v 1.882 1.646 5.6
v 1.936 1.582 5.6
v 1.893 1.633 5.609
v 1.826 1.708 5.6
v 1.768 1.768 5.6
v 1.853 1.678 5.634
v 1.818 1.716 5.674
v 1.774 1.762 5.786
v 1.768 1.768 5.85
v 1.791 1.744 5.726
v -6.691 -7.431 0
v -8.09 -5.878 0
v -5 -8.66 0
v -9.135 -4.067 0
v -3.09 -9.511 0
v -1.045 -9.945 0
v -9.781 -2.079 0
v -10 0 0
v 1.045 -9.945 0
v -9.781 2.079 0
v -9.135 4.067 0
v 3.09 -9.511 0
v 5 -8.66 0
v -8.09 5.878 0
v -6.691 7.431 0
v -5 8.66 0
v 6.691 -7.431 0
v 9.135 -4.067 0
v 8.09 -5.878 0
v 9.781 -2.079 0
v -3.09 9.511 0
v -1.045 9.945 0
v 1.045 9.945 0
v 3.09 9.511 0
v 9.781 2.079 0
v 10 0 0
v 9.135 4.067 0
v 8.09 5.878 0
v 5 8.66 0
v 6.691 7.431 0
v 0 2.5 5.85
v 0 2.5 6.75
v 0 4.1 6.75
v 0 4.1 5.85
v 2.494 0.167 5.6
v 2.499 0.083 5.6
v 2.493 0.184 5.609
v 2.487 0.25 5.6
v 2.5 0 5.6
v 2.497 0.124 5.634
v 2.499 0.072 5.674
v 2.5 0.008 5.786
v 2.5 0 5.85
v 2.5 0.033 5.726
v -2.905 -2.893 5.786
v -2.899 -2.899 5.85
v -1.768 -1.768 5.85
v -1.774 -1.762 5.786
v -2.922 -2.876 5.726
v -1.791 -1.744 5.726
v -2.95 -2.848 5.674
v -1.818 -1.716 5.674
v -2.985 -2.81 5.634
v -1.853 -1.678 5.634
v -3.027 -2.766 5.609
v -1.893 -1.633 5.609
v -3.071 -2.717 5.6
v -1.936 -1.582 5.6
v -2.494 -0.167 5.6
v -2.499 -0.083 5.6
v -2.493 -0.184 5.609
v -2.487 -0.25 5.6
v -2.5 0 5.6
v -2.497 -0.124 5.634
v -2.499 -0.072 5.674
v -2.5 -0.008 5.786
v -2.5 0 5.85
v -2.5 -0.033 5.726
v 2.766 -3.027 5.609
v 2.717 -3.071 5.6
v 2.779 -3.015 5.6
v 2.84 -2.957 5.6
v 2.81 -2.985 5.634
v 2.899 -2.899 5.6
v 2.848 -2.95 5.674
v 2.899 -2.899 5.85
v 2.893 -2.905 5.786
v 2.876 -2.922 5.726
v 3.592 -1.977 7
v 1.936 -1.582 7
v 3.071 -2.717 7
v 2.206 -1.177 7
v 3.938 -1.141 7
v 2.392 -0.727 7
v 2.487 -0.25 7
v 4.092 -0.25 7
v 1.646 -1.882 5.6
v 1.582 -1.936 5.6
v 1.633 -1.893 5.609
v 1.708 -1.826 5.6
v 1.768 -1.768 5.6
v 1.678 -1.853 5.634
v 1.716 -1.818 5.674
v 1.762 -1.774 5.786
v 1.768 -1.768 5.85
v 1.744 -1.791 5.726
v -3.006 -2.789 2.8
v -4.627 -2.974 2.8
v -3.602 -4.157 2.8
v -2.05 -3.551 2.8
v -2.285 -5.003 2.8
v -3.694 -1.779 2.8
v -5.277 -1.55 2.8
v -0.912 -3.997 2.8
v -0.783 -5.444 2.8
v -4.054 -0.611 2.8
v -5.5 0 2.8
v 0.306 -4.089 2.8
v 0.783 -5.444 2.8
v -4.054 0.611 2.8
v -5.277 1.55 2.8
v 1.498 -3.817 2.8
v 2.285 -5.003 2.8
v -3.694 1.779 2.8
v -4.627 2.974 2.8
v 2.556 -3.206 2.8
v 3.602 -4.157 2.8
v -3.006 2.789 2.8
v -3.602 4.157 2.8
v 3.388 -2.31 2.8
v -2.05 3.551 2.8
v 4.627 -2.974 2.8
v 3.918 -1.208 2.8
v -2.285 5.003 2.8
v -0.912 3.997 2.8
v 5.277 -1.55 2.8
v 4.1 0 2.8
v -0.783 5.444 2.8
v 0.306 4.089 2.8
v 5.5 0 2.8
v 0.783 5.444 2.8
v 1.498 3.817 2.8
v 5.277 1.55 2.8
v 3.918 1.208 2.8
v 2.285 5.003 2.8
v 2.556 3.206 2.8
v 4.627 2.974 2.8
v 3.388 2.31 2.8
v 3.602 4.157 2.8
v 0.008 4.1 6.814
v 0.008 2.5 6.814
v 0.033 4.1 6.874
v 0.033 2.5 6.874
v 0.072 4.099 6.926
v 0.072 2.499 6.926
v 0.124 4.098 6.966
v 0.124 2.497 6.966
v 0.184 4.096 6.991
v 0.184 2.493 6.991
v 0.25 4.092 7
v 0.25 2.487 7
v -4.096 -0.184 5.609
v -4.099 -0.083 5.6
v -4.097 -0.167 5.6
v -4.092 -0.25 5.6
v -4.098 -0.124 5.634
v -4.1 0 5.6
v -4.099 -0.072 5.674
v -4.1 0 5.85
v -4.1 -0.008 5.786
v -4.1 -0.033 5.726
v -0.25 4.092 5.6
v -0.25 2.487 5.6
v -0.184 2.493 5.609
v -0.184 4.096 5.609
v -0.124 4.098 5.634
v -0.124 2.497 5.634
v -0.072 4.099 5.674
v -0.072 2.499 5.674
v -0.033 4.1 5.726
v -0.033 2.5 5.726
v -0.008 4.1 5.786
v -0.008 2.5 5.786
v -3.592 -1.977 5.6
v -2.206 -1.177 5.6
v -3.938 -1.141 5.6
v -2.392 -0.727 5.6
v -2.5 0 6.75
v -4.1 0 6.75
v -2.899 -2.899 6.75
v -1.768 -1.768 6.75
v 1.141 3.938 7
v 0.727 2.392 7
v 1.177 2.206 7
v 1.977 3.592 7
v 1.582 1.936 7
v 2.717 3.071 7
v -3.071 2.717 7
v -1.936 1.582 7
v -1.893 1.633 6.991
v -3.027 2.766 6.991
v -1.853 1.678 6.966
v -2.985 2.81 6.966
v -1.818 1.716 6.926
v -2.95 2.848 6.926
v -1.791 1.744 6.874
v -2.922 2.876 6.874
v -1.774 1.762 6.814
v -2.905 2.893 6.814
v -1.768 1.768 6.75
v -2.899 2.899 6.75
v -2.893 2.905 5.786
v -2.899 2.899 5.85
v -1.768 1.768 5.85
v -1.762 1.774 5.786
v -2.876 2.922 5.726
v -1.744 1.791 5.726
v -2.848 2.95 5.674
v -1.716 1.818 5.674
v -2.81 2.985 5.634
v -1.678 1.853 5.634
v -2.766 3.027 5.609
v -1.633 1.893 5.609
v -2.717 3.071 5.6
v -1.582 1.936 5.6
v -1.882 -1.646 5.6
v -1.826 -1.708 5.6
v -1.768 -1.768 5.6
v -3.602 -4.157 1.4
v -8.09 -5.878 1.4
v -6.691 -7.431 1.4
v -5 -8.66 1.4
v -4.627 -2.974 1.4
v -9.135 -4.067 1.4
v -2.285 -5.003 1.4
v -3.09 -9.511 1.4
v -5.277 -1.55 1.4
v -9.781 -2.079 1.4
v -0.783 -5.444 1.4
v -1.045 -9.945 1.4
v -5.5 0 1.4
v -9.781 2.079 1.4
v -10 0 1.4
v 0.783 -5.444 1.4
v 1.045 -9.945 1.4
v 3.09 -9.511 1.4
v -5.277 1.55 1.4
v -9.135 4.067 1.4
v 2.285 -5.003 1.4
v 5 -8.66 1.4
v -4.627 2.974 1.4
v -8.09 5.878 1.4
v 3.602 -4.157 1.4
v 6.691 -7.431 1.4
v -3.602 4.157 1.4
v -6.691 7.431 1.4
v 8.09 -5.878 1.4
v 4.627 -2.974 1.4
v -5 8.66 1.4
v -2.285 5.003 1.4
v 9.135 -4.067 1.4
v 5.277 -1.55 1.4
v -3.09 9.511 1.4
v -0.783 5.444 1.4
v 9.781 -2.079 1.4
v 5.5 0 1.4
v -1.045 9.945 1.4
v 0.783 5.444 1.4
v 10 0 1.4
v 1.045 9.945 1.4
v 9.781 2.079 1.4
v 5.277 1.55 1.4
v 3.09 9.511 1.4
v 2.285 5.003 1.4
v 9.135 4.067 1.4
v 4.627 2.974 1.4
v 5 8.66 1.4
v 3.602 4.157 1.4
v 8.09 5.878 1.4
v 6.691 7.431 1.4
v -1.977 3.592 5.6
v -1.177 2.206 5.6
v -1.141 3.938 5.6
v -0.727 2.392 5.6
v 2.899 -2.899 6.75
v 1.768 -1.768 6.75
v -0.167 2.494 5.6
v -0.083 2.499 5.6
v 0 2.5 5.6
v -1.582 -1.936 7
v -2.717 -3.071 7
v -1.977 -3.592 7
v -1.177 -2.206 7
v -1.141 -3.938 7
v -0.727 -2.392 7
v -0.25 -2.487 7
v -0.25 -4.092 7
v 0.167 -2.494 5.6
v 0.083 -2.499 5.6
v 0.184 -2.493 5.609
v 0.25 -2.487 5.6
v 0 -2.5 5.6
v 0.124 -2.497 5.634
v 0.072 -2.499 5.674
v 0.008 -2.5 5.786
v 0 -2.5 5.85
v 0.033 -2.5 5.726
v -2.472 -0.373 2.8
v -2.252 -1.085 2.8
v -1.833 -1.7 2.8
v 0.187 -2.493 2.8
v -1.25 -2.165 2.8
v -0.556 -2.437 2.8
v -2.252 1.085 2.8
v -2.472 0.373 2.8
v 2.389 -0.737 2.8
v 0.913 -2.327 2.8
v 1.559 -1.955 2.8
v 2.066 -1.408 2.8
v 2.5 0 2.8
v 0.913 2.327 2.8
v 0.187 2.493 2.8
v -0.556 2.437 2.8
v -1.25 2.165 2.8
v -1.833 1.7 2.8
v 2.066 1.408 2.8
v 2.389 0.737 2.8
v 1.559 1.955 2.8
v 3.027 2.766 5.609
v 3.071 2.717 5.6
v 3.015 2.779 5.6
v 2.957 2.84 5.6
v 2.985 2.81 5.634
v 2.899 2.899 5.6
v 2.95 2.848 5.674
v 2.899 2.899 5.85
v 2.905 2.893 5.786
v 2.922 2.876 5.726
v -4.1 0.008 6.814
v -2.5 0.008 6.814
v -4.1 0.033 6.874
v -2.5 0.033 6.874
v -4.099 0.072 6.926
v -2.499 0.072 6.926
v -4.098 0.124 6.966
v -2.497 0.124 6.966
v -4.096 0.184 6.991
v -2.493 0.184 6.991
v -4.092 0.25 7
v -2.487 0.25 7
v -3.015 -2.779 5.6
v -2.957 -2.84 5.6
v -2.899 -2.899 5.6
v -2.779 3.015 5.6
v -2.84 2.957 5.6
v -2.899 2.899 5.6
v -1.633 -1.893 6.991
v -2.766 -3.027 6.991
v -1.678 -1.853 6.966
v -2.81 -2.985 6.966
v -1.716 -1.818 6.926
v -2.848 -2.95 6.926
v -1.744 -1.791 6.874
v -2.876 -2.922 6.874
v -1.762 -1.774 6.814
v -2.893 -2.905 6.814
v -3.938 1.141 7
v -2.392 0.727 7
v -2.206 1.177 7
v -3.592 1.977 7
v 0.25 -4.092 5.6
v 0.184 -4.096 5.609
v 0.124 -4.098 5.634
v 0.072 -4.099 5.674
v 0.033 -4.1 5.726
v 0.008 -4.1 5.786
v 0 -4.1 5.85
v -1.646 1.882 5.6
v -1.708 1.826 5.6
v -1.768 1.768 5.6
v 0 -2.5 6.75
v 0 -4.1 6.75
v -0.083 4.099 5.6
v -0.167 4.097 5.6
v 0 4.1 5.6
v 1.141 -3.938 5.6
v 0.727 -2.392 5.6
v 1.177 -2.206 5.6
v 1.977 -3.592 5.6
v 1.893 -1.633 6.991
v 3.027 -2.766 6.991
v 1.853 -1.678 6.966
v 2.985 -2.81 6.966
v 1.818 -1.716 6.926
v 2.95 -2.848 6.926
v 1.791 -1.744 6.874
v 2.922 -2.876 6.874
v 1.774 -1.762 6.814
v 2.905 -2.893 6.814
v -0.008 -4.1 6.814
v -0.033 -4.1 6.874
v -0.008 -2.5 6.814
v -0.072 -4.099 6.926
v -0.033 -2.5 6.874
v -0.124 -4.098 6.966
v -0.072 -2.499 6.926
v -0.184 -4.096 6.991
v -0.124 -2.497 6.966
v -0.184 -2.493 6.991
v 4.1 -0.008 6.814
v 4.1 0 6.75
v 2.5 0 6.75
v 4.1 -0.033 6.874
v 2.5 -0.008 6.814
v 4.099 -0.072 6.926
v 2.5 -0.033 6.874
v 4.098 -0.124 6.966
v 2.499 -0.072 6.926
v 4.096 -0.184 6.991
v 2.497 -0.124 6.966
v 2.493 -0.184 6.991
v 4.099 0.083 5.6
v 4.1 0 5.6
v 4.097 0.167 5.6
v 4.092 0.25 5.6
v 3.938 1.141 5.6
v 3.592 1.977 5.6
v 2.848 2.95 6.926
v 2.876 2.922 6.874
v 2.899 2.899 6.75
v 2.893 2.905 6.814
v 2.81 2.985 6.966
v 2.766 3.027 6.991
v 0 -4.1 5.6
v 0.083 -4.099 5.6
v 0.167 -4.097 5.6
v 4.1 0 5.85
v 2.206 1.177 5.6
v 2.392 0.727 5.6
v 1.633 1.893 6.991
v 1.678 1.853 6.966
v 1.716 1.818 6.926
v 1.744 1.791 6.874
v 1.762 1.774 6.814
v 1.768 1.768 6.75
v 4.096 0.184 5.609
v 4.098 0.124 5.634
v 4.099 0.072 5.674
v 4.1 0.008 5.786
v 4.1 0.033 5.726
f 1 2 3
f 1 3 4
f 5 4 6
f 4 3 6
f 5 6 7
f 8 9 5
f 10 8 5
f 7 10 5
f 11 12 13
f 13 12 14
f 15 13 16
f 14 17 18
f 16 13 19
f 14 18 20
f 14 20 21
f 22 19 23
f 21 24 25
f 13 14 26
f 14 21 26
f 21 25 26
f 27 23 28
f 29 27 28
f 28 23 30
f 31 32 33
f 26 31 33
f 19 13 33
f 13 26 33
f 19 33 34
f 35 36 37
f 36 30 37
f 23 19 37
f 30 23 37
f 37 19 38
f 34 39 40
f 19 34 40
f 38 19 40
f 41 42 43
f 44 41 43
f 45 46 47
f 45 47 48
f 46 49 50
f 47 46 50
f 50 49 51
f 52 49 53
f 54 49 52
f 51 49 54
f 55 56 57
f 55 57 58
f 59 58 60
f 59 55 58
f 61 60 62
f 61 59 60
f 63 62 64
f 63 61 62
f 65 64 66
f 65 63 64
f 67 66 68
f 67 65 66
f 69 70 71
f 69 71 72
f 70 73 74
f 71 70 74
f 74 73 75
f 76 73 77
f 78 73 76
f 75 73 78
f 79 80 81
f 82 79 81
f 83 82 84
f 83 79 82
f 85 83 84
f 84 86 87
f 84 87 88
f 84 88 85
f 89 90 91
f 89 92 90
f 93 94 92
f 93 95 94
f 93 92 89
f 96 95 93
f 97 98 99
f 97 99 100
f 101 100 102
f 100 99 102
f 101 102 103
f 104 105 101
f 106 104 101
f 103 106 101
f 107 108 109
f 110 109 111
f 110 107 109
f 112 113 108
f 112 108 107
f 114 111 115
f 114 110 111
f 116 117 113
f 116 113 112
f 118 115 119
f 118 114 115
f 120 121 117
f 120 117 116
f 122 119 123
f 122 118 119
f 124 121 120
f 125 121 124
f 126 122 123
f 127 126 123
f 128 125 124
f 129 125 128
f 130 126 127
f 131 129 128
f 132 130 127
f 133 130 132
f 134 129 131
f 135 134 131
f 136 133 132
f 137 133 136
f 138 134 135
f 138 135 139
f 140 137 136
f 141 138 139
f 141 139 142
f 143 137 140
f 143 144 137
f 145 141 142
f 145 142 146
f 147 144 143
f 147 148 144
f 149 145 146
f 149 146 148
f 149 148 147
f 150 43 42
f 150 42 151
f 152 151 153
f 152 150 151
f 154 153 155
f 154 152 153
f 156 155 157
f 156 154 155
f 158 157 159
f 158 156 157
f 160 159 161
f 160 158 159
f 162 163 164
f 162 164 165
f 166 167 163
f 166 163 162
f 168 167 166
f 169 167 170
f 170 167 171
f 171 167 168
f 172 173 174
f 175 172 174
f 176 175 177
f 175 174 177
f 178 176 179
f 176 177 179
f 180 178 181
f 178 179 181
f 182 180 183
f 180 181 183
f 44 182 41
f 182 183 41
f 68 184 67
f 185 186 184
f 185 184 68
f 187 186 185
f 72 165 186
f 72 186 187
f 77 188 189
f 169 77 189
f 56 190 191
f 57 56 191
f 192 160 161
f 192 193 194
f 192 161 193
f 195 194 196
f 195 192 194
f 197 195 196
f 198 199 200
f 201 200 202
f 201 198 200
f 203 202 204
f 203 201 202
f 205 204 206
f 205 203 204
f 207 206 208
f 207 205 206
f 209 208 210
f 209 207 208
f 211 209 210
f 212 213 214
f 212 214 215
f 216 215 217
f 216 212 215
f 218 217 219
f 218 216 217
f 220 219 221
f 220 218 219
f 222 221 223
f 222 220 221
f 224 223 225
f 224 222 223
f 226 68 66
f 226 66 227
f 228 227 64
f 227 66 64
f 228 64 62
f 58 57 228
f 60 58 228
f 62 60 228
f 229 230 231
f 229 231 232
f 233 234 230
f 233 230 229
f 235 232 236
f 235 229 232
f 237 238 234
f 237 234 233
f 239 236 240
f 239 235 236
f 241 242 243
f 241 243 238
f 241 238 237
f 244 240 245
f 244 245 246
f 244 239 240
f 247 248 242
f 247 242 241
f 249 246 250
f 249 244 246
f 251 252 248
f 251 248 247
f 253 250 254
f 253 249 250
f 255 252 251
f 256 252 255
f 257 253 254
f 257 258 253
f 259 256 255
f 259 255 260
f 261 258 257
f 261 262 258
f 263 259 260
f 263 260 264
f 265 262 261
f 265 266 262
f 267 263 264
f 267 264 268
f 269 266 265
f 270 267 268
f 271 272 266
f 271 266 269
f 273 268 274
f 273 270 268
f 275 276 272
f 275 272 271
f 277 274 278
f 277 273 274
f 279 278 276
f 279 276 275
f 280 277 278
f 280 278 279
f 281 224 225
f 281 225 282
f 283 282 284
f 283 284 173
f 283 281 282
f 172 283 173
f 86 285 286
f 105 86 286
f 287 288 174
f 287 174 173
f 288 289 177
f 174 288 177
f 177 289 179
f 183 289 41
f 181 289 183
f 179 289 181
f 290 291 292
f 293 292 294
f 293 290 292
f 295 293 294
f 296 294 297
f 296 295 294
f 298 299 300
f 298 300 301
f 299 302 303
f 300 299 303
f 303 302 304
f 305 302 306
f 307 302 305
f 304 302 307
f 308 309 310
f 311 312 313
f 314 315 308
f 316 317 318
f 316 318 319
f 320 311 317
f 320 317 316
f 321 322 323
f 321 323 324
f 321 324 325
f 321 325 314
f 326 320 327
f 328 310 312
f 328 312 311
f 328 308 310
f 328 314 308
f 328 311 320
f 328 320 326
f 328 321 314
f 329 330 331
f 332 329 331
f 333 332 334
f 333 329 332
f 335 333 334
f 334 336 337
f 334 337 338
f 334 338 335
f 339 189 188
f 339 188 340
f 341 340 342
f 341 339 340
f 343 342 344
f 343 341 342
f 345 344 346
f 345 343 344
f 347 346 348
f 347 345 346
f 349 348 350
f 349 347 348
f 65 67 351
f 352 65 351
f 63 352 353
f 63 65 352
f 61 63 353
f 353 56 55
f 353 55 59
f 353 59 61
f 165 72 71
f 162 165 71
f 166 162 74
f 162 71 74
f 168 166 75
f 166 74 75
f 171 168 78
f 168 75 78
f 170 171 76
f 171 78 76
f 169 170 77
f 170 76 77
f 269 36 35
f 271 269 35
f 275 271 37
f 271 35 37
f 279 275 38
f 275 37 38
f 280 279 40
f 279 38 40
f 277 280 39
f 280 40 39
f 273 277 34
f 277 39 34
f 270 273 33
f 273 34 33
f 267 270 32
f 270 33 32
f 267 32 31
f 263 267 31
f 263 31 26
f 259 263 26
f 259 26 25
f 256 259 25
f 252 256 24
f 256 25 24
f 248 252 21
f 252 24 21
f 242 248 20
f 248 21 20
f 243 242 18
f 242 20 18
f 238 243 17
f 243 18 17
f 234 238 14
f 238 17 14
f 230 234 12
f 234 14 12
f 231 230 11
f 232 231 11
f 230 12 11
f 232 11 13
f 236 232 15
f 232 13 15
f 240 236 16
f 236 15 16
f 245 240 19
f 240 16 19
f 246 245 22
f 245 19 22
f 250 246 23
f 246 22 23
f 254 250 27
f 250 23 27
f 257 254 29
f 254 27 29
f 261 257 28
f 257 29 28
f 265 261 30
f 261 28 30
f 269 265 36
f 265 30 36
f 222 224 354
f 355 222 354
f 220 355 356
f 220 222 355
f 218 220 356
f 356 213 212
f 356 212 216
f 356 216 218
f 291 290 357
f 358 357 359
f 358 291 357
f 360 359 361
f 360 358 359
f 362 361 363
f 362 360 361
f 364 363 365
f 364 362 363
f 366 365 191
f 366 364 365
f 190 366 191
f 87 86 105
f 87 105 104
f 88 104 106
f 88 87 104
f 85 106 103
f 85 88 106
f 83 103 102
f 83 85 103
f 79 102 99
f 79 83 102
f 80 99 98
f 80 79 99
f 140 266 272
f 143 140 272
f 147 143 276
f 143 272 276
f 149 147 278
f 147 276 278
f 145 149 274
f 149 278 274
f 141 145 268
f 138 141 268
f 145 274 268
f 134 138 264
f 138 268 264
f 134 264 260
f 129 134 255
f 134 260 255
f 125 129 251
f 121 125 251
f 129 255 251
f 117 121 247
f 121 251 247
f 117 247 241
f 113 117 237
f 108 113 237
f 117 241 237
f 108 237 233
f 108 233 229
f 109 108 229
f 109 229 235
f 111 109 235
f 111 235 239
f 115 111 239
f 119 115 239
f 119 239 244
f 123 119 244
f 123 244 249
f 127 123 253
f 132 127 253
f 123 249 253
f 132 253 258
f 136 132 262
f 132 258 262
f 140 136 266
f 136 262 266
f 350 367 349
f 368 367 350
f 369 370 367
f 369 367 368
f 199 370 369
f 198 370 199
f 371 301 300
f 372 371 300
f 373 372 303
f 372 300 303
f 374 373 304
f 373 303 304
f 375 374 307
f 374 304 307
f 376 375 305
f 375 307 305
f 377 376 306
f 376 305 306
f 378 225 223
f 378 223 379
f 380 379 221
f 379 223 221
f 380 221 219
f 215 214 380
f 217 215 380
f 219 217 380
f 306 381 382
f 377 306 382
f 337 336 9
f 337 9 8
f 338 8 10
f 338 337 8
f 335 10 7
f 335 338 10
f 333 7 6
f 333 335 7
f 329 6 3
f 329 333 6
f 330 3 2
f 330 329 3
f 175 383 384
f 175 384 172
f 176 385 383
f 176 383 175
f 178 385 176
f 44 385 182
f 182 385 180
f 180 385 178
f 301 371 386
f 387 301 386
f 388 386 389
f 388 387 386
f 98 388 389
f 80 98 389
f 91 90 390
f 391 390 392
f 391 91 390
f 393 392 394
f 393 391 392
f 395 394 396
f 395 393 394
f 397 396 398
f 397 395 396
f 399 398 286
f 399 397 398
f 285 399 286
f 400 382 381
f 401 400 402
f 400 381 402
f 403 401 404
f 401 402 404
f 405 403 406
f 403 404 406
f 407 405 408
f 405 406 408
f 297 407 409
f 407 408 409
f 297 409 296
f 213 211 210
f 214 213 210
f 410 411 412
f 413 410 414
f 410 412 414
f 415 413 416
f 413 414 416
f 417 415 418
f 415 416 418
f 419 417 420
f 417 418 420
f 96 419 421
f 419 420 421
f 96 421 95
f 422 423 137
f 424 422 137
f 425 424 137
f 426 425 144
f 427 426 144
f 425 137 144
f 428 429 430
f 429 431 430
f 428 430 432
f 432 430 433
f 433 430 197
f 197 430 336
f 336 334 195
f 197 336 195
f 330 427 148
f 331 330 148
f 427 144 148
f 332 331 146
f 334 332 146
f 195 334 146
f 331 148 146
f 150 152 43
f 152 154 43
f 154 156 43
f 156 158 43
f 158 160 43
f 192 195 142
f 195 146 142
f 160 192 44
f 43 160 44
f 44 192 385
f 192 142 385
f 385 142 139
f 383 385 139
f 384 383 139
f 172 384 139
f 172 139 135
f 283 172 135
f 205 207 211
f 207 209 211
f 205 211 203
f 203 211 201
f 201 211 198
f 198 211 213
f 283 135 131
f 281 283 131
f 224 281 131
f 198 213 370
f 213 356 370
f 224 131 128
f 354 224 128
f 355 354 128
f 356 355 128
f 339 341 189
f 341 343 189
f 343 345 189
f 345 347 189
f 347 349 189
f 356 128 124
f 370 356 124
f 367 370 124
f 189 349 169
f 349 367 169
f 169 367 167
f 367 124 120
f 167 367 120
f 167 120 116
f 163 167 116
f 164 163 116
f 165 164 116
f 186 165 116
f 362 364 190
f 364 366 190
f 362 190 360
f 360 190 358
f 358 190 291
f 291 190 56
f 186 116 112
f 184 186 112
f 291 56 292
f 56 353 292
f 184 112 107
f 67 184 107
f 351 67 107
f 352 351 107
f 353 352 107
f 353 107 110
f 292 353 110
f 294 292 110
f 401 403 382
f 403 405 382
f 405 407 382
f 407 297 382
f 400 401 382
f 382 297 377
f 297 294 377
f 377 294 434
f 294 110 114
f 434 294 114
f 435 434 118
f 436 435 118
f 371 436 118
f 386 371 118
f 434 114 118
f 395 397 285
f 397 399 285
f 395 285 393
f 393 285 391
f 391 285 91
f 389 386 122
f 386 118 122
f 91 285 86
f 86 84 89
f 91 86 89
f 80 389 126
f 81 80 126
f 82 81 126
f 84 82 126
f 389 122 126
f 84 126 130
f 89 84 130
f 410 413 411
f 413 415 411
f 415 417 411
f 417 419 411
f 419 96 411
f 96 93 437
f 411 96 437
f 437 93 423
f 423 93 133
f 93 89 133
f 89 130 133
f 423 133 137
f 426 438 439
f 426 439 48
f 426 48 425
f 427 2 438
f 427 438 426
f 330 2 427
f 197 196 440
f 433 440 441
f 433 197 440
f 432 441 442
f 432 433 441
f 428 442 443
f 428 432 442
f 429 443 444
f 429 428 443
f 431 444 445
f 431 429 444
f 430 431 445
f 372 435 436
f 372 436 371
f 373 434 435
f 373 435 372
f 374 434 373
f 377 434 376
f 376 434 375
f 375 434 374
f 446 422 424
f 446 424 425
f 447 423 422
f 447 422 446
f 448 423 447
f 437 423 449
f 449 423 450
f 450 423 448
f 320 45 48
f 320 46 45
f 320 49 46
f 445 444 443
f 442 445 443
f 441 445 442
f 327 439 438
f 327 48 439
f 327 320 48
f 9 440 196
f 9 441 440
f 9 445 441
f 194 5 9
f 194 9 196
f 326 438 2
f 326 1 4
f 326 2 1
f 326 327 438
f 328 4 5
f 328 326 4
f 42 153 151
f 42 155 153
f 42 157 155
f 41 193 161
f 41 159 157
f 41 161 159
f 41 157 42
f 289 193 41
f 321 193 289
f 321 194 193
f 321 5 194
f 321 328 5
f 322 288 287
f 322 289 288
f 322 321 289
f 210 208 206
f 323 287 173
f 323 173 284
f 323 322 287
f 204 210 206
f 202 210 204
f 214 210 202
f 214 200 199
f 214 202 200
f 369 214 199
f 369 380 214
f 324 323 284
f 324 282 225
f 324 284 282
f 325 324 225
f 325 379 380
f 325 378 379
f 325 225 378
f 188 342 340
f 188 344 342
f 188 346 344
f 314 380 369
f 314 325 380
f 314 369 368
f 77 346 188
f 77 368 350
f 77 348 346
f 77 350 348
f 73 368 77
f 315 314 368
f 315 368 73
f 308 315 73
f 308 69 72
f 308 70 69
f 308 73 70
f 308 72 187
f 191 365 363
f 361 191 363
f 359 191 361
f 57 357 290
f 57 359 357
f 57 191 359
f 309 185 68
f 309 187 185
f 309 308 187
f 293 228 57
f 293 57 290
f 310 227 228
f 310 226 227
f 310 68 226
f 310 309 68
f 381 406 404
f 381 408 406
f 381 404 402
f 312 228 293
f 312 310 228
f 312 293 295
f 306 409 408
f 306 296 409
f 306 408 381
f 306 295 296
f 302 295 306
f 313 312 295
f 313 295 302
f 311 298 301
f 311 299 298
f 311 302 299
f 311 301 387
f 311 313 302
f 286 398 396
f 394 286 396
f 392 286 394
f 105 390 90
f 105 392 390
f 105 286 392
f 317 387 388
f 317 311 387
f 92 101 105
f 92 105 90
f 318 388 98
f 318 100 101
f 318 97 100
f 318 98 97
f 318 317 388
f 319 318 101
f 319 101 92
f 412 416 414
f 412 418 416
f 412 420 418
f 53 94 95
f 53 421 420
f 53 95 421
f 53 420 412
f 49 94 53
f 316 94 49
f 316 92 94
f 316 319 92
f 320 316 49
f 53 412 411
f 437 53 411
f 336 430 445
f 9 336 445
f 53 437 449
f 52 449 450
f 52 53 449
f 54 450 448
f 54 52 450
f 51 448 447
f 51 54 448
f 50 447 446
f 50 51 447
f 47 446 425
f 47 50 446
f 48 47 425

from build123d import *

# Parameters (mm, degrees)
F0_R         = 10
F1_DEPTH     = 1.4
F2_R         = 5.5
F3_DEPTH     = 1.4
F4_R         = 4.1
F4_R_2       = 2.5
F5_DEPTH     = 4.2
F7_DEPTH     = 1.4
F8_T4_DEPTH  = 2.85
F8_S5_R      = 4.1
F8_T6_DEPTH  = 3
F8_S7_R      = 2.5
F8_T8_DEPTH  = 3
F8_T12_DEPTH = 2.85
F8_S13_R     = 4.1
F8_T14_DEPTH = 3
F8_S15_R     = 2.5
F8_T16_DEPTH = 3
F8_T20_DEPTH = 2.85
F8_S21_R     = 4.1
F8_T22_DEPTH = 3
F8_S23_R     = 2.5
F8_T24_DEPTH = 3
F8_T28_DEPTH = 2.85
F8_S29_R     = 4.1
F8_T30_DEPTH = 3
F8_S31_R     = 2.5
F8_T32_DEPTH = 3
F8_T36_DEPTH = 2.85
F8_S37_R     = 4.1
F8_T38_DEPTH = 3
F8_S39_R     = 2.5
F8_T40_DEPTH = 3
F8_T44_DEPTH = 2.85
F8_S45_R     = 4.1
F8_T46_DEPTH = 3
F8_S47_R     = 2.5
F8_T48_DEPTH = 3
F8_T52_DEPTH = 2.85
F8_S53_R     = 4.1
F8_T54_DEPTH = 3
F8_S55_R     = 2.5
F8_T56_DEPTH = 3
F8_T60_DEPTH = 2.85
F8_S61_R     = 4.1
F8_T62_DEPTH = 3
F8_S63_R     = 2.5
F8_T64_DEPTH = 3
F8_T65_DEPTH = 2.85
F8_T67_DEPTH = 2.85
F8_T69_DEPTH = 2.85
F8_T71_DEPTH = 2.85
F8_T73_DEPTH = 2.85
F8_T75_DEPTH = 2.85
F8_T77_DEPTH = 2.85
F8_T79_DEPTH = 2.85


# Not quite as in the source:
# - a fillet or chamfer that OpenCascade refuses, or shapes differently, is made with other operations: its cross-section is extruded or revolved along the edge and cut away or added


with BuildPart() as f1:
    # F0 (on Top) → F1 (new body)
    with BuildSketch(Plane.XY):
        Circle(F0_R)
    extrude(amount=F1_DEPTH)

    # F2 (on face) → F3 (join)
    with BuildSketch(Plane.XY.offset(1.4)):
        Circle(F2_R)
    extrude(amount=F3_DEPTH)

    # F4 (on face) → F5 (join)
    with BuildSketch(Plane.XY.offset(2.8)):
        Circle(F4_R)
        Circle(F4_R_2, mode=Mode.SUBTRACT)
    extrude(amount=F5_DEPTH)

    # F6 (on face) → F7 (cut)
    with BuildSketch(Plane.XY.offset(7)):
        with BuildLine():
            Line((0, -2.5), (0, -4.1))
            ThreePointArc((0, -4.1), (1.5690020727, -3.7879060833), (2.8991378029, -2.8991378029))
            Line((2.8991378029, -2.8991378029), (1.767766953, -1.767766953))
            ThreePointArc((1.767766953, -1.767766953), (0.9567085809, -2.3096988313), (0, -2.5))
        make_face()
        with BuildLine():
            ThreePointArc((-4.1, 0), (-3.7879060833, -1.5690020727), (-2.8991378029, -2.8991378029))
            Line((-2.8991378029, -2.8991378029), (-1.767766953, -1.767766953))
            ThreePointArc((-1.767766953, -1.767766953), (-2.3096988313, -0.9567085809), (-2.5, 0))
            Line((-2.5, 0), (-4.1, 0))
        make_face()
        with BuildLine():
            Line((2.5, 0), (4.1, 0))
            ThreePointArc((4.1, 0), (3.7879060833, 1.5690020727), (2.8991378029, 2.8991378029))
            Line((2.8991378029, 2.8991378029), (1.767766953, 1.767766953))
            ThreePointArc((1.767766953, 1.767766953), (2.3096988313, 0.9567085809), (2.5, 0))
        make_face()
        with BuildLine():
            ThreePointArc((-1.767766953, 1.767766953), (-0.9567085809, 2.3096988313), (0, 2.5))
            Line((0, 2.5), (0, 4.1))
            ThreePointArc((0, 4.1), (-1.5690020727, 3.7879060833), (-2.8991378029, 2.8991378029))
            Line((-2.8991378029, 2.8991378029), (-1.767766953, 1.767766953))
        make_face()
    extrude(amount=-F7_DEPTH, mode=Mode.SUBTRACT)

    # F8: fillet of radius 0.25 on 16 edges, made by hand


with BuildPart() as f8_tool2:
    # F8_s3 → F8_t4 (new body)
    with BuildSketch(Plane.YZ.offset(-1.875)):
        with BuildLine():
            ThreePointArc((-0.25, 5.6), (-0.0732233047, 5.6732233047), (0, 5.85))
            Line((0, 5.85), (0, 5.6))
            Line((0, 5.6), (-0.25, 5.6))
        make_face()
    extrude(amount=-F8_T4_DEPTH)

    # F8_s5 → F8_t6 (intersect, symmetric)
    with BuildSketch(Plane.XY.offset(5.7)):
        Circle(F8_S5_R)
    extrude(amount=F8_T6_DEPTH, both=True, mode=Mode.INTERSECT)

    # F8_s7 → F8_t8 (cut, symmetric)
    with BuildSketch(Plane.XY.offset(5.7)):
        Circle(F8_S7_R)
    extrude(amount=F8_T8_DEPTH, both=True, mode=Mode.SUBTRACT)


with BuildPart() as f1_1:
    add(f1.part)

    # F8_t1: union F8_tool2
    add(f8_tool2.part)


with BuildPart() as f8_tool10:
    # F8_s11 → F8_t12 (new body)
    with BuildSketch(Plane.XZ.offset(-1.875)):
        with BuildLine():
            ThreePointArc((-0.25, 5.6), (-0.0732233047, 5.6732233047), (0, 5.85))
            Line((0, 5.85), (0, 5.6))
            Line((0, 5.6), (-0.25, 5.6))
        make_face()
    extrude(amount=-F8_T12_DEPTH)

    # F8_s13 → F8_t14 (intersect, symmetric)
    with BuildSketch(Plane.XY.offset(5.7)):
        Circle(F8_S13_R)
    extrude(amount=F8_T14_DEPTH, both=True, mode=Mode.INTERSECT)

    # F8_s15 → F8_t16 (cut, symmetric)
    with BuildSketch(Plane.XY.offset(5.7)):
        Circle(F8_S15_R)
    extrude(amount=F8_T16_DEPTH, both=True, mode=Mode.SUBTRACT)


with BuildPart() as f1_2:
    add(f1_1.part)

    # F8_t9: union F8_tool10
    add(f8_tool10.part)


with BuildPart() as f8_tool18:
    # F8_s19 → F8_t20 (new body)
    with BuildSketch(Plane(origin=(3.3410795411, -3.3410795411, 0), x_dir=(0, 0, 1), z_dir=(-0.7071067812, 0.7071067812, 0))):
        with BuildLine():
            ThreePointArc((5.85, 0), (5.6732233047, -0.0732233047), (5.6, -0.25))
            Line((5.6, -0.25), (5.6, 0))
            Line((5.6, 0), (5.85, 0))
        make_face()
    extrude(amount=F8_T20_DEPTH)

    # F8_s21 → F8_t22 (intersect, symmetric)
    with BuildSketch(Plane.XY.offset(5.7)):
        Circle(F8_S21_R)
    extrude(amount=F8_T22_DEPTH, both=True, mode=Mode.INTERSECT)

    # F8_s23 → F8_t24 (cut, symmetric)
    with BuildSketch(Plane.XY.offset(5.7)):
        Circle(F8_S23_R)
    extrude(amount=F8_T24_DEPTH, both=True, mode=Mode.SUBTRACT)


with BuildPart() as f1_3:
    add(f1_2.part)

    # F8_t17: union F8_tool18
    add(f8_tool18.part)


with BuildPart() as f8_tool26:
    # F8_s27 → F8_t28 (new body)
    with BuildSketch(Plane.YZ.offset(1.875)):
        with BuildLine():
            ThreePointArc((0, 5.85), (0.0732233047, 5.6732233047), (0.25, 5.6))
            Line((0.25, 5.6), (0, 5.6))
            Line((0, 5.6), (0, 5.85))
        make_face()
    extrude(amount=F8_T28_DEPTH)

    # F8_s29 → F8_t30 (intersect, symmetric)
    with BuildSketch(Plane.XY.offset(5.7)):
        Circle(F8_S29_R)
    extrude(amount=F8_T30_DEPTH, both=True, mode=Mode.INTERSECT)

    # F8_s31 → F8_t32 (cut, symmetric)
    with BuildSketch(Plane.XY.offset(5.7)):
        Circle(F8_S31_R)
    extrude(amount=F8_T32_DEPTH, both=True, mode=Mode.SUBTRACT)


with BuildPart() as f1_4:
    add(f1_3.part)

    # F8_t25: union F8_tool26
    add(f8_tool26.part)


with BuildPart() as f8_tool34:
    # F8_s35 → F8_t36 (new body)
    with BuildSketch(Plane(origin=(-3.3410795411, -3.3410795411, 0), x_dir=(0, 0, 1), z_dir=(0.7071067812, 0.7071067812, 0))):
        with BuildLine():
            ThreePointArc((5.85, 0), (5.6732233047, -0.0732233047), (5.6, -0.25))
            Line((5.6, -0.25), (5.6, 0))
            Line((5.6, 0), (5.85, 0))
        make_face()
    extrude(amount=F8_T36_DEPTH)

    # F8_s37 → F8_t38 (intersect, symmetric)
    with BuildSketch(Plane.XY.offset(5.7)):
        Circle(F8_S37_R)
    extrude(amount=F8_T38_DEPTH, both=True, mode=Mode.INTERSECT)

    # F8_s39 → F8_t40 (cut, symmetric)
    with BuildSketch(Plane.XY.offset(5.7)):
        Circle(F8_S39_R)
    extrude(amount=F8_T40_DEPTH, both=True, mode=Mode.SUBTRACT)


with BuildPart() as f1_5:
    add(f1_4.part)

    # F8_t33: union F8_tool34
    add(f8_tool34.part)


with BuildPart() as f8_tool42:
    # F8_s43 → F8_t44 (new body)
    with BuildSketch(Plane(origin=(-3.3410795411, 3.3410795411, 0), x_dir=(0, 0, 1), z_dir=(0.7071067812, -0.7071067812, 0))):
        with BuildLine():
            ThreePointArc((5.85, 0), (5.6732233047, -0.0732233047), (5.6, -0.25))
            Line((5.6, -0.25), (5.6, 0))
            Line((5.6, 0), (5.85, 0))
        make_face()
    extrude(amount=F8_T44_DEPTH)

    # F8_s45 → F8_t46 (intersect, symmetric)
    with BuildSketch(Plane.XY.offset(5.7)):
        Circle(F8_S45_R)
    extrude(amount=F8_T46_DEPTH, both=True, mode=Mode.INTERSECT)

    # F8_s47 → F8_t48 (cut, symmetric)
    with BuildSketch(Plane.XY.offset(5.7)):
        Circle(F8_S47_R)
    extrude(amount=F8_T48_DEPTH, both=True, mode=Mode.SUBTRACT)


with BuildPart() as f1_6:
    add(f1_5.part)

    # F8_t41: union F8_tool42
    add(f8_tool42.part)


with BuildPart() as f8_tool50:
    # F8_s51 → F8_t52 (new body)
    with BuildSketch(Plane.XZ.offset(1.875)):
        with BuildLine():
            ThreePointArc((0.25, 5.6), (0.0732233047, 5.6732233047), (0, 5.85))
            Line((0, 5.85), (0, 5.6))
            Line((0, 5.6), (0.25, 5.6))
        make_face()
    extrude(amount=F8_T52_DEPTH)

    # F8_s53 → F8_t54 (intersect, symmetric)
    with BuildSketch(Plane.XY.offset(5.7)):
        Circle(F8_S53_R)
    extrude(amount=F8_T54_DEPTH, both=True, mode=Mode.INTERSECT)

    # F8_s55 → F8_t56 (cut, symmetric)
    with BuildSketch(Plane.XY.offset(5.7)):
        Circle(F8_S55_R)
    extrude(amount=F8_T56_DEPTH, both=True, mode=Mode.SUBTRACT)


with BuildPart() as f1_7:
    add(f1_6.part)

    # F8_t49: union F8_tool50
    add(f8_tool50.part)


with BuildPart() as f8_tool58:
    # F8_s59 → F8_t60 (new body)
    with BuildSketch(Plane(origin=(3.3410795411, 3.3410795411, 0), x_dir=(0, 0, 1), z_dir=(-0.7071067812, -0.7071067812, 0))):
        with BuildLine():
            ThreePointArc((5.85, 0), (5.6732233047, -0.0732233047), (5.6, -0.25))
            Line((5.6, -0.25), (5.6, 0))
            Line((5.6, 0), (5.85, 0))
        make_face()
    extrude(amount=F8_T60_DEPTH)

    # F8_s61 → F8_t62 (intersect, symmetric)
    with BuildSketch(Plane.XY.offset(5.7)):
        Circle(F8_S61_R)
    extrude(amount=F8_T62_DEPTH, both=True, mode=Mode.INTERSECT)

    # F8_s63 → F8_t64 (cut, symmetric)
    with BuildSketch(Plane.XY.offset(5.7)):
        Circle(F8_S63_R)
    extrude(amount=F8_T64_DEPTH, both=True, mode=Mode.SUBTRACT)


with BuildPart() as f1_8:
    add(f1_7.part)

    # F8_t57: union F8_tool58
    add(f8_tool58.part)

    # F8_s66 → F8_t65 (cut)
    with BuildSketch(Plane.YZ.offset(-4.725)):
        with BuildLine():
            ThreePointArc((0, 6.75), (0.0732233047, 6.9267766953), (0.25, 7))
            Line((0.25, 7), (0, 7))
            Line((0, 7), (0, 6.75))
        make_face()
    extrude(amount=F8_T65_DEPTH, mode=Mode.SUBTRACT)

    # F8_s68 → F8_t67 (cut)
    with BuildSketch(Plane(origin=(-3.3410795411, 3.3410795411, 0), x_dir=(0, 0, 1), z_dir=(0.7071067812, -0.7071067812, 0))):
        with BuildLine():
            ThreePointArc((7, 0.25), (6.9267766953, 0.0732233047), (6.75, 0))
            Line((6.75, 0), (7, 0))
            Line((7, 0), (7, 0.25))
        make_face()
    extrude(amount=F8_T67_DEPTH, mode=Mode.SUBTRACT)

    # F8_s70 → F8_t69 (cut)
    with BuildSketch(Plane.XZ.offset(1.875)):
        with BuildLine():
            ThreePointArc((0, 6.75), (-0.0732233047, 6.9267766953), (-0.25, 7))
            Line((-0.25, 7), (0, 7))
            Line((0, 7), (0, 6.75))
        make_face()
    extrude(amount=F8_T69_DEPTH, mode=Mode.SUBTRACT)

    # F8_s72 → F8_t71 (cut)
    with BuildSketch(Plane(origin=(-3.3410795411, -3.3410795411, 0), x_dir=(0, 0, 1), z_dir=(0.7071067812, 0.7071067812, 0))):
        with BuildLine():
            ThreePointArc((7, 0.25), (6.9267766953, 0.0732233047), (6.75, 0))
            Line((6.75, 0), (7, 0))
            Line((7, 0), (7, 0.25))
        make_face()
    extrude(amount=F8_T71_DEPTH, mode=Mode.SUBTRACT)

    # F8_s74 → F8_t73 (cut)
    with BuildSketch(Plane.YZ.offset(1.875)):
        with BuildLine():
            ThreePointArc((0, 6.75), (-0.0732233047, 6.9267766953), (-0.25, 7))
            Line((-0.25, 7), (0, 7))
            Line((0, 7), (0, 6.75))
        make_face()
    extrude(amount=F8_T73_DEPTH, mode=Mode.SUBTRACT)

    # F8_s76 → F8_t75 (cut)
    with BuildSketch(Plane(origin=(3.3410795411, -3.3410795411, 0), x_dir=(0, 0, 1), z_dir=(-0.7071067812, 0.7071067812, 0))):
        with BuildLine():
            ThreePointArc((7, 0.25), (6.9267766953, 0.0732233047), (6.75, 0))
            Line((6.75, 0), (7, 0))
            Line((7, 0), (7, 0.25))
        make_face()
    extrude(amount=F8_T75_DEPTH, mode=Mode.SUBTRACT)

    # F8_s78 → F8_t77 (cut)
    with BuildSketch(Plane.XZ.offset(-4.725)):
        with BuildLine():
            ThreePointArc((0, 6.75), (0.0732233047, 6.9267766953), (0.25, 7))
            Line((0.25, 7), (0, 7))
            Line((0, 7), (0, 6.75))
        make_face()
    extrude(amount=F8_T77_DEPTH, mode=Mode.SUBTRACT)

    # F8_s80 → F8_t79 (cut)
    with BuildSketch(Plane(origin=(3.3410795411, 3.3410795411, 0), x_dir=(0, 0, 1), z_dir=(-0.7071067812, -0.7071067812, 0))):
        with BuildLine():
            ThreePointArc((7, 0.25), (6.9267766953, 0.0732233047), (6.75, 0))
            Line((6.75, 0), (7, 0))
            Line((7, 0), (7, 0.25))
        make_face()
    extrude(amount=F8_T79_DEPTH, mode=Mode.SUBTRACT)


solid = f1_8.part
